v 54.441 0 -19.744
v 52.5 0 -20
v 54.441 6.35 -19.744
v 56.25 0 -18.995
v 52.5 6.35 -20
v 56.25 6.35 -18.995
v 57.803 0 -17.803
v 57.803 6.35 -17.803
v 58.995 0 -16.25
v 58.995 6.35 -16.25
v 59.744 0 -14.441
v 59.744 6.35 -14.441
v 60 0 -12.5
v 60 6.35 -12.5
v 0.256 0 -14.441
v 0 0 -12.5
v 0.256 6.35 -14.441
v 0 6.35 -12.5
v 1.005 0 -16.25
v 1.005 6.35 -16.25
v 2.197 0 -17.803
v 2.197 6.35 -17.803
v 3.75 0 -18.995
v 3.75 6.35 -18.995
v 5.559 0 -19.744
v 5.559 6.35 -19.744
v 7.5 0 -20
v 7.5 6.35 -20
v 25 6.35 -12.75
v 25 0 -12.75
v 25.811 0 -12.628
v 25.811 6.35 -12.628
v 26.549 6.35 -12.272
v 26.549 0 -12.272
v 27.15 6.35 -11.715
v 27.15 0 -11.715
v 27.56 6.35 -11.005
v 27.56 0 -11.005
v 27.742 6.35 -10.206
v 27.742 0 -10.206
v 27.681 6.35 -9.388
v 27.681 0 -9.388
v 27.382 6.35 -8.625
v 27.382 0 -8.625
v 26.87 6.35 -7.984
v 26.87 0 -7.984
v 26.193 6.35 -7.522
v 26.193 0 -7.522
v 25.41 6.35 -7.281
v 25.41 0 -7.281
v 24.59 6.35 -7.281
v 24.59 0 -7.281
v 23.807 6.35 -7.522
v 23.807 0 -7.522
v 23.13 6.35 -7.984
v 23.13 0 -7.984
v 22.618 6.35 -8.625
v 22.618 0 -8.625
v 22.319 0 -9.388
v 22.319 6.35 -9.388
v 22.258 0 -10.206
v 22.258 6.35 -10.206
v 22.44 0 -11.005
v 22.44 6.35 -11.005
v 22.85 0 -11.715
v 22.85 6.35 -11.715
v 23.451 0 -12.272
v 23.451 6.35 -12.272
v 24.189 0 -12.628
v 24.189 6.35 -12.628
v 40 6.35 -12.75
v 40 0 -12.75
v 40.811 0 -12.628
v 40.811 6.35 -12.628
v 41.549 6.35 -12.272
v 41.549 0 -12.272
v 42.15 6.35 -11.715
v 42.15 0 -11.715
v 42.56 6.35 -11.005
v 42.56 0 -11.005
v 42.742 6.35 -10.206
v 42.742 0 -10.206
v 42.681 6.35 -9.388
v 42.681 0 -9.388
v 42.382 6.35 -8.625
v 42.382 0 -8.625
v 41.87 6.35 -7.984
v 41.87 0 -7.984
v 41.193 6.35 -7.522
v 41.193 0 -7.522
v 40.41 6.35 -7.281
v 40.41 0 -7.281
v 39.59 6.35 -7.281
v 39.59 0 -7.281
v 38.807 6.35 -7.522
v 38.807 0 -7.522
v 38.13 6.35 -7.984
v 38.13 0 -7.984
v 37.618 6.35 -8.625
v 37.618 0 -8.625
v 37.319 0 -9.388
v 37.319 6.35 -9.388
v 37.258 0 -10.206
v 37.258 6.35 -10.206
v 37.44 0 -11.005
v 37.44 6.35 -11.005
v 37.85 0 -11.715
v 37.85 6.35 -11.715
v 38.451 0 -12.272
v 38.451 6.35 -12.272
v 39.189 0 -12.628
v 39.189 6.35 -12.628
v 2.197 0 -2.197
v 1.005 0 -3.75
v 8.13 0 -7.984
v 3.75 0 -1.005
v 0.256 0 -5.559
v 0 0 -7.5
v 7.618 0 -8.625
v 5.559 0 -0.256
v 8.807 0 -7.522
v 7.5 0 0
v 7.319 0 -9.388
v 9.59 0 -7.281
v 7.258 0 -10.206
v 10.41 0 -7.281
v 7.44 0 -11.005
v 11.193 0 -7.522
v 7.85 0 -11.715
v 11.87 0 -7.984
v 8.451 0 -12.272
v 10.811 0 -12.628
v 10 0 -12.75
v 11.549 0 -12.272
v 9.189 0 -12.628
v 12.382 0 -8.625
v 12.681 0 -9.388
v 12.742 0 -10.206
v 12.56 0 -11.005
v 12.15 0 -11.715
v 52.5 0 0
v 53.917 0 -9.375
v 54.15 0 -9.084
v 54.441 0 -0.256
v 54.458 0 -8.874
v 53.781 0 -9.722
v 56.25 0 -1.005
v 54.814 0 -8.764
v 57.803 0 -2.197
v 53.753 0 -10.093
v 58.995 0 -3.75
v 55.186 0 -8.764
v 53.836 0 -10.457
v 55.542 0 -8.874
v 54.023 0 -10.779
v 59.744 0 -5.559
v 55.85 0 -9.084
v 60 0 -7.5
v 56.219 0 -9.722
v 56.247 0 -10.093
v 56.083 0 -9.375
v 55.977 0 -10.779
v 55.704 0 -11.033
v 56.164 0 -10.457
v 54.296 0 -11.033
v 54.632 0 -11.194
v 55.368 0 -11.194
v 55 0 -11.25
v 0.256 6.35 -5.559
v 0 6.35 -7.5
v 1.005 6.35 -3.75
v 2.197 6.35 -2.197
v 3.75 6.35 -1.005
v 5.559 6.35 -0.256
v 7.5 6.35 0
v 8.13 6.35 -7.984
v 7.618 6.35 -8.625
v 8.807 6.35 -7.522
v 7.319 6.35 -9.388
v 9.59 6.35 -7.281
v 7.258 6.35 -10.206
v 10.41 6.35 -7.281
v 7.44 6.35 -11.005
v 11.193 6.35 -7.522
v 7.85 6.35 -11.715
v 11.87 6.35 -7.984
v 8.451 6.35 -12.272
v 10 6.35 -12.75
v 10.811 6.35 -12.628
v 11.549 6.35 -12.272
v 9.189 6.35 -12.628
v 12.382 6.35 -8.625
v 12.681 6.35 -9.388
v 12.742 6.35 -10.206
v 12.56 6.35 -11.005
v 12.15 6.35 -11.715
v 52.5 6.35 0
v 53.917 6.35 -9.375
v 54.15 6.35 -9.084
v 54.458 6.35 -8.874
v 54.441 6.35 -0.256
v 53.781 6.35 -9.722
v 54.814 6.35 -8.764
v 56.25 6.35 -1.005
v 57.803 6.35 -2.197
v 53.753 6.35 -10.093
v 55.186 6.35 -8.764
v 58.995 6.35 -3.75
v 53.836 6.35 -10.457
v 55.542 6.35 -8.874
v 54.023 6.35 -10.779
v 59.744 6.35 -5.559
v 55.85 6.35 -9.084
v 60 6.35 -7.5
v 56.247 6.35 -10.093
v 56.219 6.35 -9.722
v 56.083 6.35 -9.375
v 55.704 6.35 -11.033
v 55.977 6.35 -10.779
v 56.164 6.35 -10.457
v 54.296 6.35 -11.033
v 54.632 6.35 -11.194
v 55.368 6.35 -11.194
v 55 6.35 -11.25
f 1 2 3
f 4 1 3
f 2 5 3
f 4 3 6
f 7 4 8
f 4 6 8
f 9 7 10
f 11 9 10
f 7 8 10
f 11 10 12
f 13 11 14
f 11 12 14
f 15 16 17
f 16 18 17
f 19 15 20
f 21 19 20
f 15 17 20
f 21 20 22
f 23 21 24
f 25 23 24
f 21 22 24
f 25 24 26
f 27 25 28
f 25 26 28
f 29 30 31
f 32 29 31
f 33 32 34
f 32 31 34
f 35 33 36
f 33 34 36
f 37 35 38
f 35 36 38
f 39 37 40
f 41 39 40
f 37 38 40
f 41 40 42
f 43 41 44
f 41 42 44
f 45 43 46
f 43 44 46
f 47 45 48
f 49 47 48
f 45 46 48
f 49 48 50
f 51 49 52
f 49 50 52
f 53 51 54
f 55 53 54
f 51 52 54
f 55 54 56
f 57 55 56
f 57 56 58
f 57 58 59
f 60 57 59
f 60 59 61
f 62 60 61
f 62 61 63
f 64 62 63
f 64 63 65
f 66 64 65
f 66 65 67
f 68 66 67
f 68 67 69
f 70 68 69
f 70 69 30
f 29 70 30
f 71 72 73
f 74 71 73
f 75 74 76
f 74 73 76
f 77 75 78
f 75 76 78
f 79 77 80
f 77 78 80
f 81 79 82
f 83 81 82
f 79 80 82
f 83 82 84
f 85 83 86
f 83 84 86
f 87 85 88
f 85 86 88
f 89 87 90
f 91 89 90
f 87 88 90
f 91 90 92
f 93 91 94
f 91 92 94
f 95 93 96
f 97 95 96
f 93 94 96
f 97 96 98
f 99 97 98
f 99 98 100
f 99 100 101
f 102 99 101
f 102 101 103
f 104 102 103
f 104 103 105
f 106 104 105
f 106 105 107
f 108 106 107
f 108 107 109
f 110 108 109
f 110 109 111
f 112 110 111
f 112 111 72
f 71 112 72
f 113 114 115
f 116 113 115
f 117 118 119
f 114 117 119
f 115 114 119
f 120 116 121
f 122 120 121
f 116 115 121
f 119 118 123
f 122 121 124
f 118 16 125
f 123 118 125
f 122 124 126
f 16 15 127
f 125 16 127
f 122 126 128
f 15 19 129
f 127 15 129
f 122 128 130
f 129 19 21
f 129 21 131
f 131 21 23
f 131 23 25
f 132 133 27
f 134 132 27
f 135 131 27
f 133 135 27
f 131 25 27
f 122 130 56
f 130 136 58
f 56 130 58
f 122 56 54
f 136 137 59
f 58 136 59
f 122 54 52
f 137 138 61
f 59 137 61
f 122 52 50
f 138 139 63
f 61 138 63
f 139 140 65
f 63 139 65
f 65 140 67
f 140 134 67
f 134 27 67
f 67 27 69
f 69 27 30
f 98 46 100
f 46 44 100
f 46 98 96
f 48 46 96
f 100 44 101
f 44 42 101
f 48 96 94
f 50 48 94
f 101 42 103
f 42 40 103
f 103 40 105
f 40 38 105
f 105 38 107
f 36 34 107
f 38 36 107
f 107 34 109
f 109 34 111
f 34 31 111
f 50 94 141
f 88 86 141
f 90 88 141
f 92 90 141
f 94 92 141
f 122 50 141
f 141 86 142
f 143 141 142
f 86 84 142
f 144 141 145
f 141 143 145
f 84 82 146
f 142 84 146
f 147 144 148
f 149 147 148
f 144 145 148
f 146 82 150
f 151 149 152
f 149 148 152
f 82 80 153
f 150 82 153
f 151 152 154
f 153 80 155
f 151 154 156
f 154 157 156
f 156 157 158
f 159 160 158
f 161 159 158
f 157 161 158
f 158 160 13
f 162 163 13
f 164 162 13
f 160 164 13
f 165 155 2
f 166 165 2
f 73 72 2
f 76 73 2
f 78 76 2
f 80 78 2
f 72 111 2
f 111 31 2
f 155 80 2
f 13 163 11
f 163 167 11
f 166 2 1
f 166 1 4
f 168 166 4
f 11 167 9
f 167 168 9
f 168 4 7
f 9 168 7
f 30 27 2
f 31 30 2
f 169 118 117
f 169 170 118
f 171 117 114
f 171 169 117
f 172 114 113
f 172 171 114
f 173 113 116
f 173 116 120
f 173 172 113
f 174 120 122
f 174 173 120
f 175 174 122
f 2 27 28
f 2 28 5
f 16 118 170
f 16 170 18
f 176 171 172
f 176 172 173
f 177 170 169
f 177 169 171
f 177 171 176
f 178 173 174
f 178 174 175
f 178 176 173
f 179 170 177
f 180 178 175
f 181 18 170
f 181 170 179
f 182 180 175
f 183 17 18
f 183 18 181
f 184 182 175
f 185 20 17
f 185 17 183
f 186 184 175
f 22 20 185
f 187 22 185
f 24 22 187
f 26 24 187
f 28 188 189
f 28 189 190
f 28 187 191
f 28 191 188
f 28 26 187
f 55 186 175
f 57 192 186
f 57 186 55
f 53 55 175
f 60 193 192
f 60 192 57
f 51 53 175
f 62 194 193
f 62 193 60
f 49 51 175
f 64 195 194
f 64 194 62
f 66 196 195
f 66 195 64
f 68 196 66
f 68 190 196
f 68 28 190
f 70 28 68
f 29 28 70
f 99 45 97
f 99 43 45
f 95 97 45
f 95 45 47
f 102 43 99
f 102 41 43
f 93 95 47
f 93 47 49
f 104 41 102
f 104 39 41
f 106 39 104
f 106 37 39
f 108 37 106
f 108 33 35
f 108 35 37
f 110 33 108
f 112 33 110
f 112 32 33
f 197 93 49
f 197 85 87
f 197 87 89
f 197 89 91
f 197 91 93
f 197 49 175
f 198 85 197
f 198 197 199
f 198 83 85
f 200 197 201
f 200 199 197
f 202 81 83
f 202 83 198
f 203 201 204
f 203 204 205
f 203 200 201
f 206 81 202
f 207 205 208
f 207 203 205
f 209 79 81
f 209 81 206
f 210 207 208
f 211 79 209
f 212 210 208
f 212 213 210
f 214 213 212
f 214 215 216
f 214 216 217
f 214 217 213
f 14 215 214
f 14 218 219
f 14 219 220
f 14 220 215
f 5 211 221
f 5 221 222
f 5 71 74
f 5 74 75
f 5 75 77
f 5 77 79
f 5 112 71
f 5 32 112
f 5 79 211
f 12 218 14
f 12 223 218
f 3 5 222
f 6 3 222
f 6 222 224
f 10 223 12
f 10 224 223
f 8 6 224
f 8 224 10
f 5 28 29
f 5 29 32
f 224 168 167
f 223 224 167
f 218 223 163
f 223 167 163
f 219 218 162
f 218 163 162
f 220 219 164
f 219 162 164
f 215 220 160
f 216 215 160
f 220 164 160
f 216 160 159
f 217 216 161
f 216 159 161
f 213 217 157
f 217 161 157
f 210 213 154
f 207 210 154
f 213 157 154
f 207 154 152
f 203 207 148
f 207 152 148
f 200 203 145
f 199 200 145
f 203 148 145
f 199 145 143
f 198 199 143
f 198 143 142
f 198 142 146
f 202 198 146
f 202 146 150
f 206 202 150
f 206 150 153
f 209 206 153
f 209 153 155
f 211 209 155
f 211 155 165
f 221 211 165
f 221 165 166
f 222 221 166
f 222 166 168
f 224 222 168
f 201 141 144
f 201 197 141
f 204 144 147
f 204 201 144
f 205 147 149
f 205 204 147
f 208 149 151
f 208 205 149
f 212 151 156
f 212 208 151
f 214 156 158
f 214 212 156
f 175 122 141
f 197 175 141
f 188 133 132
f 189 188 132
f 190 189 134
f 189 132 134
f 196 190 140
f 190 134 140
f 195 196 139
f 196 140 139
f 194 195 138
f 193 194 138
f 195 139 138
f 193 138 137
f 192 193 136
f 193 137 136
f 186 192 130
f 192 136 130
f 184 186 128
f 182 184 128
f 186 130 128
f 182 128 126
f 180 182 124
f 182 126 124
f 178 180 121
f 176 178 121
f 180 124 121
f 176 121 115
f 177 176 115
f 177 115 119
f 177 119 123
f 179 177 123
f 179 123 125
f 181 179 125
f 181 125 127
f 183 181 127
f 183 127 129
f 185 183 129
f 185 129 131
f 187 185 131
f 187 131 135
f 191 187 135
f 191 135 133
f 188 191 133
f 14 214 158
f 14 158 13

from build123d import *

# Parameters (mm, degrees)
SKETCH2_W                   = 60
SKETCH2_H                   = 20
BOSS_EXTRUDE1_DEPTH         = 6.35
M5_CLEARANCE_HOLE1_D        = 5.5
TAP_DRILL_FOR_M3X0_5_TAP1_D = 2.5
FILLET1_R                   = 7.5


with BuildPart() as part:
    # Sketch2 → Boss-Extrude1 (new body)
    with BuildSketch(Plane(origin=(0, 0, 0), x_dir=(1, 0, 0), z_dir=(0, 1, 0))):
        with Locations((30, 10)):
            Rectangle(SKETCH2_W, SKETCH2_H)
    extrude(amount=BOSS_EXTRUDE1_DEPTH)

    # M5 Clearance Hole1 (through all)
    with Locations(Plane(origin=(10, 6.35, -10), x_dir=(0, 0, 1), z_dir=(0, 1, 0))):
        with Locations((0, 0), (0, 15), (0, 30)):
            Hole(M5_CLEARANCE_HOLE1_D / 2)

    # Tap Drill for M3x0.5 Tap1 (through all)
    with Locations(Plane(origin=(55, 6.35, -10), x_dir=(0, 0, 1), z_dir=(0, 1, 0))):
        with Locations((0, 0)):
            Hole(TAP_DRILL_FOR_M3X0_5_TAP1_D / 2)

    # Fillet1
    fillet1_edges = [part.edges().sort_by_distance(p)[0] for p in [
        (0, 3.175, -20),
        (60, 3.175, -20),
        (60, 3.175, 0),
        (0, 3.175, 0),
    ]]
    fillet(fillet1_edges, radius=FILLET1_R)


solid = part.part
